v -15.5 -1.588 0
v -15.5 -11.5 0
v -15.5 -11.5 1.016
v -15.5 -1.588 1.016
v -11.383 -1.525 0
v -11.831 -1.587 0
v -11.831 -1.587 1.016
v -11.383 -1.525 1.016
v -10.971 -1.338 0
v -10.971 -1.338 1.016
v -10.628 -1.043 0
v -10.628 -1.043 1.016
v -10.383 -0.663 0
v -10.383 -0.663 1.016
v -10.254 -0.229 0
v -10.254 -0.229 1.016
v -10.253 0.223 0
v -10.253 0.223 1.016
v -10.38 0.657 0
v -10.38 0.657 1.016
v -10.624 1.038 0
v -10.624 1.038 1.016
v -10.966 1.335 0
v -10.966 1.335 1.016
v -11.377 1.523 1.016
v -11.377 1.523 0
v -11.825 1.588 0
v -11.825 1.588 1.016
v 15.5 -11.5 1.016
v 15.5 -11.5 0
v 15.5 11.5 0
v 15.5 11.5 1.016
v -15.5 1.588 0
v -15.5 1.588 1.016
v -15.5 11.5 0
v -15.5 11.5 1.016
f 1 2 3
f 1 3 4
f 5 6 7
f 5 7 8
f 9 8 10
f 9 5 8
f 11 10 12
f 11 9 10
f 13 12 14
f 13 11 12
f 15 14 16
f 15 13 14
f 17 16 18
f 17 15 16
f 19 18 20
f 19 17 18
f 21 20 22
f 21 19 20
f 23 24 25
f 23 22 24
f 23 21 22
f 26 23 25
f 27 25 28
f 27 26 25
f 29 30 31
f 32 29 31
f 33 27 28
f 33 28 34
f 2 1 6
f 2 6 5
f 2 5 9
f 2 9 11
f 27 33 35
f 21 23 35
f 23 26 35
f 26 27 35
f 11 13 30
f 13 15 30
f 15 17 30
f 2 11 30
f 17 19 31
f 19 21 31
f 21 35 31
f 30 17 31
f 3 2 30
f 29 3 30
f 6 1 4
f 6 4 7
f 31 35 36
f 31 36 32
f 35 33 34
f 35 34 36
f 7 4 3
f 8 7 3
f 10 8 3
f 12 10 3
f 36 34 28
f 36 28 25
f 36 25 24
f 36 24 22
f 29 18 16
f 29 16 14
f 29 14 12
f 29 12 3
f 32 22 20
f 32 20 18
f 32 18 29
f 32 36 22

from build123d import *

# Parameters (mm, degrees)
SKETCH1_W           = 31
SKETCH1_H           = 23
BOSS_EXTRUDE1_DEPTH = 1.016
CUT_EXTRUDE1_DEPTH  = 20.326982589


with BuildPart() as part:
    # Sketch1 → Boss-Extrude1 (new body)
    with BuildSketch(Plane.XY):
        Rectangle(SKETCH1_W, SKETCH1_H)
    extrude(amount=BOSS_EXTRUDE1_DEPTH)

    # Sketch2 → Cut-Extrude1 (cut, through all)
    with BuildSketch(Plane(origin=(0, 0, 0), x_dir=(-1, 0, 0), z_dir=(0, 0, -1))):
        with BuildLine():
            Line((11.825, 1.5875), (15.5, 1.5875))
            Line((15.5, 1.5875), (15.5, -1.5875))
            Line((15.5, -1.5875), (11.831296781, -1.587487512))
            ThreePointArc((11.831296781, -1.587487512), (10.237503122, -0.003148397), (11.825, 1.5875))
        make_face()
    extrude(amount=-CUT_EXTRUDE1_DEPTH, mode=Mode.SUBTRACT)


solid = part.part
